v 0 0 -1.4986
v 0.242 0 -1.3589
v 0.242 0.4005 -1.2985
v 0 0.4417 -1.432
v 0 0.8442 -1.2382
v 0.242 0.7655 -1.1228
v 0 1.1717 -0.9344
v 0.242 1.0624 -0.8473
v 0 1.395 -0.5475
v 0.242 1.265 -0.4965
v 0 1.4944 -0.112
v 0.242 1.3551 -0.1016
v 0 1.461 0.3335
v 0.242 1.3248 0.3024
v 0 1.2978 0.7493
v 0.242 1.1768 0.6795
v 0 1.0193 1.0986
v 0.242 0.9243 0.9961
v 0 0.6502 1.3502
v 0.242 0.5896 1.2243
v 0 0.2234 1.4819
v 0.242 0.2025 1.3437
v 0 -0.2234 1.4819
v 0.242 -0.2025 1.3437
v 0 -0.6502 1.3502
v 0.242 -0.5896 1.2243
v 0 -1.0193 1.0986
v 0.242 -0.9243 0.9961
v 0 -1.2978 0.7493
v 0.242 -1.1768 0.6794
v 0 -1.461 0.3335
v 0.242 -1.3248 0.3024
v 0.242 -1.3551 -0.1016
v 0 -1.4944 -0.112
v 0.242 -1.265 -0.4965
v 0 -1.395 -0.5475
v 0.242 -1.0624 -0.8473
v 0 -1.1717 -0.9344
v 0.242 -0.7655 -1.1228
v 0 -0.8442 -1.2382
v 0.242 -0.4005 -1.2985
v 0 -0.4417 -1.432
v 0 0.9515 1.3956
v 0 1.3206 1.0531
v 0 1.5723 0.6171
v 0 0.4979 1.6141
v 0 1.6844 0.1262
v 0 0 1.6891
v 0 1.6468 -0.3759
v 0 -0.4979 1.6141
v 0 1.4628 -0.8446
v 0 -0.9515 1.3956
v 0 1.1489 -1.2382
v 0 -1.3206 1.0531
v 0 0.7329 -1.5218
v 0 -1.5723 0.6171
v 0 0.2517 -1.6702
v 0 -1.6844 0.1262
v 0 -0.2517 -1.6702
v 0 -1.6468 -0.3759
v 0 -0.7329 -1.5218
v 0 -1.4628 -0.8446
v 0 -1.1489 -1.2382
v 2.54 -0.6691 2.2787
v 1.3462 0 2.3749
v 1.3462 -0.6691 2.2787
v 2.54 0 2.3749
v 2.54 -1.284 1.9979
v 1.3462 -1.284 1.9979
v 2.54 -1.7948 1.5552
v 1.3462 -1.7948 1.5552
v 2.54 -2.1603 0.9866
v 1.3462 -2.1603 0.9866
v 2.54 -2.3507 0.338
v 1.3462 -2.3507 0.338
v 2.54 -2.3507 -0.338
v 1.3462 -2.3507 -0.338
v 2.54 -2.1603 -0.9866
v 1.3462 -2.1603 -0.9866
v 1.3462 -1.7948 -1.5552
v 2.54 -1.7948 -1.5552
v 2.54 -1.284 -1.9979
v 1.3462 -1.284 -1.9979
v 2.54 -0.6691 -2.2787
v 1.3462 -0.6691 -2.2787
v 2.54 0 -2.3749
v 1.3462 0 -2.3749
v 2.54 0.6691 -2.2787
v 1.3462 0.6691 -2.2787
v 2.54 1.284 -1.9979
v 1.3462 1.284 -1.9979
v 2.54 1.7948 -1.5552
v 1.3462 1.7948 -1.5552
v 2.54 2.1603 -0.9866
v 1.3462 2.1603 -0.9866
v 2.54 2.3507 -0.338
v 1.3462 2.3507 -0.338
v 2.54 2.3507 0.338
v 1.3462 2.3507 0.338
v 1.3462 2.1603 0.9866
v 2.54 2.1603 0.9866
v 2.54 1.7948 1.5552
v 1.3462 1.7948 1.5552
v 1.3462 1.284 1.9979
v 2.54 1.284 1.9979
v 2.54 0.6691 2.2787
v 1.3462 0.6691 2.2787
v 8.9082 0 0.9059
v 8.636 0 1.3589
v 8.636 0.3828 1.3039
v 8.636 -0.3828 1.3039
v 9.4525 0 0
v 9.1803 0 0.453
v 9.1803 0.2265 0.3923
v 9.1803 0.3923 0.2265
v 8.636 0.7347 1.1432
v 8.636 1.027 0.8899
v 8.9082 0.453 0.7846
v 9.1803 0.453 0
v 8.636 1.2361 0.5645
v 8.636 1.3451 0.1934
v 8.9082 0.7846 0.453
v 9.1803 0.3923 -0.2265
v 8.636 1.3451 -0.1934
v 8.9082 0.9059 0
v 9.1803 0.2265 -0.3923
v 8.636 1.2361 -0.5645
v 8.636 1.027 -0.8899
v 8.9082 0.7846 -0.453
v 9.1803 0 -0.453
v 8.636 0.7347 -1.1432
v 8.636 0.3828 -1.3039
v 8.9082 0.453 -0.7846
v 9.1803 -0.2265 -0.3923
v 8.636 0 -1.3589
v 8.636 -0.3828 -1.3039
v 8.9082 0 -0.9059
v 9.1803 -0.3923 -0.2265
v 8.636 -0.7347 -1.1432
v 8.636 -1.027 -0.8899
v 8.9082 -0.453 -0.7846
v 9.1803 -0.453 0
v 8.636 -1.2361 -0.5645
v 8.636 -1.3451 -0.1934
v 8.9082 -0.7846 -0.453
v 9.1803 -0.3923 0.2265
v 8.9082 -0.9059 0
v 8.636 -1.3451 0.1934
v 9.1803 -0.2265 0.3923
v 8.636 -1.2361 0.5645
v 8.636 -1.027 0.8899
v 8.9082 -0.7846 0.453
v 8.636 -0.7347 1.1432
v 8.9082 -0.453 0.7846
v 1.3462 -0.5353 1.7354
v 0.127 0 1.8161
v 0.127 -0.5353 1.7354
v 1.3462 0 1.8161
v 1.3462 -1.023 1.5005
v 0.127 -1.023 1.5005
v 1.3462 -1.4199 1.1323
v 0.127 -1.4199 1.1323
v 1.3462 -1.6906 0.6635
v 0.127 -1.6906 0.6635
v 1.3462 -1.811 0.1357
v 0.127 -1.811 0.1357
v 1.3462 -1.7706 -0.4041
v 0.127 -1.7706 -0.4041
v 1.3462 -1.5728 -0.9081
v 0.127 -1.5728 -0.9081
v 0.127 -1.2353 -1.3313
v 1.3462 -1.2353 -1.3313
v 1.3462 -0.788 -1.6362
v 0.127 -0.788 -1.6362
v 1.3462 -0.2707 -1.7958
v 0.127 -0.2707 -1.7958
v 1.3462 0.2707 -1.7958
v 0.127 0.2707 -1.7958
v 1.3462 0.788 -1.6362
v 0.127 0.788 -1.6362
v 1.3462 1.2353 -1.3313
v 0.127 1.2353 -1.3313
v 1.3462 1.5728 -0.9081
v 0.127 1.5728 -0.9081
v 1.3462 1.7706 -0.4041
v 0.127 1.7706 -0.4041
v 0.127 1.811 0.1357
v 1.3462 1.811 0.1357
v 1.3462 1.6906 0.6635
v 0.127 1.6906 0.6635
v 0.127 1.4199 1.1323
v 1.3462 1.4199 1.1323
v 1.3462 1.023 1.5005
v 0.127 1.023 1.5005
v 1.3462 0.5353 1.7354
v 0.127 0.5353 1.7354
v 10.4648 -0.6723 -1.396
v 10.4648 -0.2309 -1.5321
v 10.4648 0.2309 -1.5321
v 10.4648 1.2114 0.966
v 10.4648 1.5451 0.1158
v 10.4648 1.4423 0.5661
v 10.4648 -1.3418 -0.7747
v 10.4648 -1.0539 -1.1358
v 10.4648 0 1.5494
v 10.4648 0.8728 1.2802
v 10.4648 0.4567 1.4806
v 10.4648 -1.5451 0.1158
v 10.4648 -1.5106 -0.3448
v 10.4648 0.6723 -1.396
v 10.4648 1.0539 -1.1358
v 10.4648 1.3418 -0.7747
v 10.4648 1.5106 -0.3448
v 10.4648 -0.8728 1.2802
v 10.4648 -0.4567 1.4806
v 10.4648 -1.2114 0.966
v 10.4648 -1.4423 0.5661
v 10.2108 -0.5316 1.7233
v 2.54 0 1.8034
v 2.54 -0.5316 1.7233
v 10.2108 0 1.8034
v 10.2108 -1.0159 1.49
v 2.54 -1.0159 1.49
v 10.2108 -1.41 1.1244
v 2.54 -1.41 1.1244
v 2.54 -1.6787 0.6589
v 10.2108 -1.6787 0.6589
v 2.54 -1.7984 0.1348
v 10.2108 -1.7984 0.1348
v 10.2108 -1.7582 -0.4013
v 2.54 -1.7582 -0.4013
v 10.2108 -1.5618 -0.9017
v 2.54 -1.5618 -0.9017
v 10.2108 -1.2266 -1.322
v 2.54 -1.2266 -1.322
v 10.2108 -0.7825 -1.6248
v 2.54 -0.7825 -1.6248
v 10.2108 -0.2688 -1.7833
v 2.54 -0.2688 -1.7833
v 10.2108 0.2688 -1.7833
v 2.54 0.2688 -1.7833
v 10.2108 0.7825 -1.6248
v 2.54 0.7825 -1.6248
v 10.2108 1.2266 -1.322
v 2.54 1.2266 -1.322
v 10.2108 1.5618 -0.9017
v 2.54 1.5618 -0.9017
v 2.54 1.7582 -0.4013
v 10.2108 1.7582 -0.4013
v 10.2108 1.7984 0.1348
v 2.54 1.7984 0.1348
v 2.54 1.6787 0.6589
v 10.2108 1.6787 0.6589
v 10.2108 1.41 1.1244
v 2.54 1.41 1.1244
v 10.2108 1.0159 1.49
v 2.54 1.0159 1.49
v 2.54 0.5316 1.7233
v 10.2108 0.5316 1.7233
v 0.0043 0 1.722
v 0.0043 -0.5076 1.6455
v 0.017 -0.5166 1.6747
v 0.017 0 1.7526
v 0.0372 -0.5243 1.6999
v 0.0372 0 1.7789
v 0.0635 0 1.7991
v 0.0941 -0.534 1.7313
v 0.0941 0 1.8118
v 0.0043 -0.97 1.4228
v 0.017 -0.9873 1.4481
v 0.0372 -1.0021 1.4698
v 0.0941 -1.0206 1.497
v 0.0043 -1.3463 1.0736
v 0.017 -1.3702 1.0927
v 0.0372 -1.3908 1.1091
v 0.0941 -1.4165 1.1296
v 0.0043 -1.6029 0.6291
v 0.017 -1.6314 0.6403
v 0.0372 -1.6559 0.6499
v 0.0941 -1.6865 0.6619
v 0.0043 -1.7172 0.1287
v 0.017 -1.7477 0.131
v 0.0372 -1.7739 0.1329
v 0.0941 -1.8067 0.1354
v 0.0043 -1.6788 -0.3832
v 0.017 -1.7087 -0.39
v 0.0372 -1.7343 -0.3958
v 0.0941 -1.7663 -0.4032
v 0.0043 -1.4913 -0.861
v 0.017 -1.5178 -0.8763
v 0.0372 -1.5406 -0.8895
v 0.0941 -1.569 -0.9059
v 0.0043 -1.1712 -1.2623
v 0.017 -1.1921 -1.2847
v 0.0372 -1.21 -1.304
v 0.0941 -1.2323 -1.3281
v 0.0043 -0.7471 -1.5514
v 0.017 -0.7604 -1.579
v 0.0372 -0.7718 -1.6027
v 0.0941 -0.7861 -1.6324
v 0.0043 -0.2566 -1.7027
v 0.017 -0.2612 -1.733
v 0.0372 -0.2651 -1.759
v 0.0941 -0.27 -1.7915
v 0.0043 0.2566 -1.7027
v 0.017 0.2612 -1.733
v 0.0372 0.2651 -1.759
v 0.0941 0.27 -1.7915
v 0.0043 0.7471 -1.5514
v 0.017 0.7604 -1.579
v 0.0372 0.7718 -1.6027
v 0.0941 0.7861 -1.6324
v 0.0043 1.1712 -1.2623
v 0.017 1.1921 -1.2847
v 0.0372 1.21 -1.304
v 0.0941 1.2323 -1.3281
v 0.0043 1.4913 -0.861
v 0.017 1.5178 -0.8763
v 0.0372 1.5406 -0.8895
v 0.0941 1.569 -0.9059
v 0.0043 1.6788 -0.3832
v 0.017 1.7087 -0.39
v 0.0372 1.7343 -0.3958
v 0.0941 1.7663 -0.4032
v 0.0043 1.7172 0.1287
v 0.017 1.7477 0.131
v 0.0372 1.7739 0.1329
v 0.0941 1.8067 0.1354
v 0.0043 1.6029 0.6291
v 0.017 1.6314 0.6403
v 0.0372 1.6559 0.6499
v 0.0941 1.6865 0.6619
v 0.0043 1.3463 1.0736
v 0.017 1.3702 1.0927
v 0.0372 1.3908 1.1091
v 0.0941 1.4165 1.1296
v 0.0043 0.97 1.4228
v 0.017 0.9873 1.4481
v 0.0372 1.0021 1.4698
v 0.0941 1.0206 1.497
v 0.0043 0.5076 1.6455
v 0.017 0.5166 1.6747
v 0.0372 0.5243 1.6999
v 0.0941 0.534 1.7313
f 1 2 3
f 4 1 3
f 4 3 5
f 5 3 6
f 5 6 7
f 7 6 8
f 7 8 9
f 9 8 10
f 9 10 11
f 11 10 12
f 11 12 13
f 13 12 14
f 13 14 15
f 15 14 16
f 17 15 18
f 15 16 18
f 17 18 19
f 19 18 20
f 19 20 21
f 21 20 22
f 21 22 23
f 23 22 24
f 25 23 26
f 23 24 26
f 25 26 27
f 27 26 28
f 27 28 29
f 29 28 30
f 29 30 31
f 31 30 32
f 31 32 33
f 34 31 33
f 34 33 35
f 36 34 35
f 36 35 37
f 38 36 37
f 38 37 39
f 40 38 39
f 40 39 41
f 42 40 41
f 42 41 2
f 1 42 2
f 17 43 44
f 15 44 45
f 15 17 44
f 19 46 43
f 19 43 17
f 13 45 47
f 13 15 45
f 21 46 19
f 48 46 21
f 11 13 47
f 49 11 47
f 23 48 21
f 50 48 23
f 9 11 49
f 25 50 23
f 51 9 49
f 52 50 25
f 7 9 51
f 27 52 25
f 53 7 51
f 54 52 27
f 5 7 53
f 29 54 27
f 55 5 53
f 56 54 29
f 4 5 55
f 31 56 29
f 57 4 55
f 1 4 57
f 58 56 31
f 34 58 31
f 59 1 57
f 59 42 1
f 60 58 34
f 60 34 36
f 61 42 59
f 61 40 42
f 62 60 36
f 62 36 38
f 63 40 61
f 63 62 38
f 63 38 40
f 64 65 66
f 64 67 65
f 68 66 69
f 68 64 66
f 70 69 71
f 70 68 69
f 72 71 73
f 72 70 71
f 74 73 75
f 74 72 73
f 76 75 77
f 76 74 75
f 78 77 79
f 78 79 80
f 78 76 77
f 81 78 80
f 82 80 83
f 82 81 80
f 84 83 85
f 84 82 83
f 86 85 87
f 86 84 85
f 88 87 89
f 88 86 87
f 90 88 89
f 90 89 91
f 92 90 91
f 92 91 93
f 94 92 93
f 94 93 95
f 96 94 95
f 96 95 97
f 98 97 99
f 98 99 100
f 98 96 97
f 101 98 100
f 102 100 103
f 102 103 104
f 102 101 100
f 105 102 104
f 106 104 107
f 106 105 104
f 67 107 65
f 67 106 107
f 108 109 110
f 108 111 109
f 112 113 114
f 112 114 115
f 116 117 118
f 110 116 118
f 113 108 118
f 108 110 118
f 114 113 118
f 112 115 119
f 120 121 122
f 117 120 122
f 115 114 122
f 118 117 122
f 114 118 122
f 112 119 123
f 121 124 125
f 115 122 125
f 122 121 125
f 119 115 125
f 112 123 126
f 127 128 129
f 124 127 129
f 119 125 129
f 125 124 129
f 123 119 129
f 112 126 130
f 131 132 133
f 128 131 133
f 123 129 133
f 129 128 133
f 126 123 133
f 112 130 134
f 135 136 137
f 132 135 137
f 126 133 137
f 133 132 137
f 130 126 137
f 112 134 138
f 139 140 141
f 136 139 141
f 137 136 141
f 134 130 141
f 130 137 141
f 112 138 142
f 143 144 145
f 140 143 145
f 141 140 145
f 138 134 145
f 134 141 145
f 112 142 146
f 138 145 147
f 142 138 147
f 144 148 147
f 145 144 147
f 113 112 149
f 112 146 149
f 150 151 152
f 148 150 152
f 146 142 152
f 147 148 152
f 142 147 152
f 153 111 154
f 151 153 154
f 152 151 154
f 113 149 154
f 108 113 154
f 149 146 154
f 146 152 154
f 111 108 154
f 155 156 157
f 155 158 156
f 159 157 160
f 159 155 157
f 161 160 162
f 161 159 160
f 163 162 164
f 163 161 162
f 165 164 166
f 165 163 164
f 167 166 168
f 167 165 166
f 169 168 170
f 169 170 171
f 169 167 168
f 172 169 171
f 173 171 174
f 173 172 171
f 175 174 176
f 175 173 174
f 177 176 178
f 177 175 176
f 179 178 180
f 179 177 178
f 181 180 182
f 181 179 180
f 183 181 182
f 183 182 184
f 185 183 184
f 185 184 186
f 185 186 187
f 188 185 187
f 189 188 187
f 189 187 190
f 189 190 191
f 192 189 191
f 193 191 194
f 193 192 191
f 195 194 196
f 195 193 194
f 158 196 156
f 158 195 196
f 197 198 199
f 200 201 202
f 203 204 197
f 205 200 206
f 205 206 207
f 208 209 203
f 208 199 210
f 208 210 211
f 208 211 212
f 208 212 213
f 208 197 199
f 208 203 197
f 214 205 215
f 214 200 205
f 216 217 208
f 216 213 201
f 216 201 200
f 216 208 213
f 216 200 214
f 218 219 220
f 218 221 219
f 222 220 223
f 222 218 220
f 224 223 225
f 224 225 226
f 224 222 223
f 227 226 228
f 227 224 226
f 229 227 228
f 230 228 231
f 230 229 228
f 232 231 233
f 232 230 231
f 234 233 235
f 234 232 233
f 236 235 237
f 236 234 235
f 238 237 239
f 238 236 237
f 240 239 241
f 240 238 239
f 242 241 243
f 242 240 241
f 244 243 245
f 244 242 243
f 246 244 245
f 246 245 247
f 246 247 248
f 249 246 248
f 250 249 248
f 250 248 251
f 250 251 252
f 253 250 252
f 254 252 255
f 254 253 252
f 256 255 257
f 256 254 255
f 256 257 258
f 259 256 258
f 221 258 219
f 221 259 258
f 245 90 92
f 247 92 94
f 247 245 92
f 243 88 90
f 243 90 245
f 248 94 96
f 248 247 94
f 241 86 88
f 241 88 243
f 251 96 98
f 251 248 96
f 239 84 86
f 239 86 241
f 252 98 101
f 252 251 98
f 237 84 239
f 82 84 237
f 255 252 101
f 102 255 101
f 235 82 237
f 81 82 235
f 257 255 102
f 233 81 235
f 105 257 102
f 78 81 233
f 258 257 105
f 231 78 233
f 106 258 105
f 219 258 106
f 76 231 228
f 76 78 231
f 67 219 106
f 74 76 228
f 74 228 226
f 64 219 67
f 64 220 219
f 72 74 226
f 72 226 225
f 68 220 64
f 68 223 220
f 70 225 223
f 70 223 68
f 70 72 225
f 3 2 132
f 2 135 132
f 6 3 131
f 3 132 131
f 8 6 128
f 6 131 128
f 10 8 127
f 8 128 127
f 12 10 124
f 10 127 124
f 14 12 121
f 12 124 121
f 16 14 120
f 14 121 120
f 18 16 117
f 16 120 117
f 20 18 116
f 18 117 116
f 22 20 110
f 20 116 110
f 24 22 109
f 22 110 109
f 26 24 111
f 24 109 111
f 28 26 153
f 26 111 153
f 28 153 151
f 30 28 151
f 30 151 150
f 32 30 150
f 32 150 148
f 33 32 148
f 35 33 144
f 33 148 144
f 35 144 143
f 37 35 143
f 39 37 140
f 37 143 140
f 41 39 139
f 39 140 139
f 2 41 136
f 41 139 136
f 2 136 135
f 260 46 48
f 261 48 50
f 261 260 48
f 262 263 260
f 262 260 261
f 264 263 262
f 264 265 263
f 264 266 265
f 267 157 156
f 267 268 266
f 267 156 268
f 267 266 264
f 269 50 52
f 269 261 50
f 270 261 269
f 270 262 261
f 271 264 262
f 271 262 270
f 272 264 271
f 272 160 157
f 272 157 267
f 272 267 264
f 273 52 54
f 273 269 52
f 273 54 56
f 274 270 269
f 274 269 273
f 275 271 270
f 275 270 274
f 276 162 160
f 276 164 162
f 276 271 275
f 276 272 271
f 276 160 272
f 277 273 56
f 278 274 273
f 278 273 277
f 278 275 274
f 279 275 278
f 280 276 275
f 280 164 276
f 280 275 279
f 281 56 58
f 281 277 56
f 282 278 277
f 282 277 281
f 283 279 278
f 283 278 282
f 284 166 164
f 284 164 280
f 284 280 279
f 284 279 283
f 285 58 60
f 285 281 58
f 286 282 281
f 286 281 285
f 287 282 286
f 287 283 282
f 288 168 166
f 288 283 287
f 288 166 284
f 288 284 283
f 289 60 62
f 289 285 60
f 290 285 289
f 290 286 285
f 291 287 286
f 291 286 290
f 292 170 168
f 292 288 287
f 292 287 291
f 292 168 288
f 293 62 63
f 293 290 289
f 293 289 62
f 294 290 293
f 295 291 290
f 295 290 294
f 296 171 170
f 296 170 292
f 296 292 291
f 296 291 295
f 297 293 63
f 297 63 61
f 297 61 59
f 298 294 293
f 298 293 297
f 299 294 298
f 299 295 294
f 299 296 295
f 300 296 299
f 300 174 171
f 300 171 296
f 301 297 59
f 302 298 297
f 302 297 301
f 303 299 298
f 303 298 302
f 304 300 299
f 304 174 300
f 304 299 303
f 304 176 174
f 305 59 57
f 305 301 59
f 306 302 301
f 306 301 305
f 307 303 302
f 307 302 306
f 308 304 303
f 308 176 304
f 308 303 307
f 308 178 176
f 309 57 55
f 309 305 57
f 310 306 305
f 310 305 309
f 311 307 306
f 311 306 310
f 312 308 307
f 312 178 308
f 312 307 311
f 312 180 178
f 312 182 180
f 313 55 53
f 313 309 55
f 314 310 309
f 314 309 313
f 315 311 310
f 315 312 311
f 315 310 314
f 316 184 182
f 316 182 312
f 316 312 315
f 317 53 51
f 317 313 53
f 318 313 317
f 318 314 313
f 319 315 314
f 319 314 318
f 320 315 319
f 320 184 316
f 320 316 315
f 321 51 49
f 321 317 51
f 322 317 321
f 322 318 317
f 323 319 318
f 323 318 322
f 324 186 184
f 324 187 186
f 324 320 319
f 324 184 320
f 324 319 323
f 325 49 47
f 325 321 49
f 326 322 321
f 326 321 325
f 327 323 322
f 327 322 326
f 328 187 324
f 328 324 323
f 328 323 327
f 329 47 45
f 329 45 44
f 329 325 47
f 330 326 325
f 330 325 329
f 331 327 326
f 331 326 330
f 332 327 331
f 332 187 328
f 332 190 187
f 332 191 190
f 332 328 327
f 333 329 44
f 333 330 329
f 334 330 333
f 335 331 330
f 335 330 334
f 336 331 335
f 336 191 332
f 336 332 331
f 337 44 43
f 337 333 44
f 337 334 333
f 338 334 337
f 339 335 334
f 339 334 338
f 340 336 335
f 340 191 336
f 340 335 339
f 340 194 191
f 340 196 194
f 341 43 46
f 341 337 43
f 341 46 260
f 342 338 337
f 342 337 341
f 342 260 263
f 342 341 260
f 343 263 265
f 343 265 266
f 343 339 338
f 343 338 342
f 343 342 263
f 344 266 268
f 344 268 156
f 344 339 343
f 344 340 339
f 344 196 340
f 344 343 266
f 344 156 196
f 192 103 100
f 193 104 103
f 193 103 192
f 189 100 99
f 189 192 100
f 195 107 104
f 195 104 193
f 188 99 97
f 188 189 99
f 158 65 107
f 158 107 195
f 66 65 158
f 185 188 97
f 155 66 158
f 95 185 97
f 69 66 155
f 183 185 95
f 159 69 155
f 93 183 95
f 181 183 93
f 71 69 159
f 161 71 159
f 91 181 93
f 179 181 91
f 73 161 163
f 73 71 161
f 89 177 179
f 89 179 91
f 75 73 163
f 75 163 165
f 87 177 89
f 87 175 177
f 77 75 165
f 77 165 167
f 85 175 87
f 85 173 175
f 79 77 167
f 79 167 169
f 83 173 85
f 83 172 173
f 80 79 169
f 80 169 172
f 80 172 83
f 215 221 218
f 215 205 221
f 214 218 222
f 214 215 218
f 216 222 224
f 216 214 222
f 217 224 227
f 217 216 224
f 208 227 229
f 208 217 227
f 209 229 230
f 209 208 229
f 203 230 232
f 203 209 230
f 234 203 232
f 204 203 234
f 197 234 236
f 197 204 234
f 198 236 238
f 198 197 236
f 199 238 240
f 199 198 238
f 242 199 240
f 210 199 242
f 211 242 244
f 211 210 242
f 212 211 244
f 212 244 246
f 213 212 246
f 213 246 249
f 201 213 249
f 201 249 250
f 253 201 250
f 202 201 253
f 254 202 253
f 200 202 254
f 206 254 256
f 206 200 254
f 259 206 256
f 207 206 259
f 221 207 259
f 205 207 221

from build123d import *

# Parameters (mm, degrees)
HOLE1_D           = 2.7178
HOLE1_DEPTH       = 8.636
HOLE1_CSINK_D     = 2.9972
HOLE1_CSINK_ANGLE = 60
HOLE1_TIP         = 0.816509495


with BuildPart() as part:
    # Sketch1 → RevolutionAngle1 (revolve)
    with BuildSketch(Plane.XY):
        with BuildLine():
            Line((0.127, 1.8161), (1.3462, 1.8161))
            Line((1.3462, 1.8161), (1.3462, 2.3749))
            Line((1.3462, 2.3749), (2.54, 2.3749))
            Line((2.54, 2.3749), (2.54, 1.8034))
            Line((2.54, 1.8034), (10.2108, 1.8034))
            Line((10.2108, 1.8034), (10.4648, 1.5494))
            Line((10.4648, 1.5494), (10.4648, 0))
            Line((10.4648, 0), (0, 0))
            Line((0, 0), (0, 1.6891))
            ThreePointArc((0, 1.6891), (0.037197439, 1.778902561), (0.127, 1.8161))
        make_face()
    revolve(axis=Axis((0, 0, 0), (1, 0, 0)))

    # Hole1
    with Locations(Plane.ZY):
        with Locations((0, 0)):
            CounterSinkHole(HOLE1_D / 2, HOLE1_CSINK_D / 2, depth=HOLE1_DEPTH, counter_sink_angle=HOLE1_CSINK_ANGLE)
            with Locations((0, 0, -(HOLE1_DEPTH + HOLE1_TIP / 2))):  # 118° drill point
                Cone(0, HOLE1_D / 2, HOLE1_TIP, mode=Mode.SUBTRACT)


solid = part.part
